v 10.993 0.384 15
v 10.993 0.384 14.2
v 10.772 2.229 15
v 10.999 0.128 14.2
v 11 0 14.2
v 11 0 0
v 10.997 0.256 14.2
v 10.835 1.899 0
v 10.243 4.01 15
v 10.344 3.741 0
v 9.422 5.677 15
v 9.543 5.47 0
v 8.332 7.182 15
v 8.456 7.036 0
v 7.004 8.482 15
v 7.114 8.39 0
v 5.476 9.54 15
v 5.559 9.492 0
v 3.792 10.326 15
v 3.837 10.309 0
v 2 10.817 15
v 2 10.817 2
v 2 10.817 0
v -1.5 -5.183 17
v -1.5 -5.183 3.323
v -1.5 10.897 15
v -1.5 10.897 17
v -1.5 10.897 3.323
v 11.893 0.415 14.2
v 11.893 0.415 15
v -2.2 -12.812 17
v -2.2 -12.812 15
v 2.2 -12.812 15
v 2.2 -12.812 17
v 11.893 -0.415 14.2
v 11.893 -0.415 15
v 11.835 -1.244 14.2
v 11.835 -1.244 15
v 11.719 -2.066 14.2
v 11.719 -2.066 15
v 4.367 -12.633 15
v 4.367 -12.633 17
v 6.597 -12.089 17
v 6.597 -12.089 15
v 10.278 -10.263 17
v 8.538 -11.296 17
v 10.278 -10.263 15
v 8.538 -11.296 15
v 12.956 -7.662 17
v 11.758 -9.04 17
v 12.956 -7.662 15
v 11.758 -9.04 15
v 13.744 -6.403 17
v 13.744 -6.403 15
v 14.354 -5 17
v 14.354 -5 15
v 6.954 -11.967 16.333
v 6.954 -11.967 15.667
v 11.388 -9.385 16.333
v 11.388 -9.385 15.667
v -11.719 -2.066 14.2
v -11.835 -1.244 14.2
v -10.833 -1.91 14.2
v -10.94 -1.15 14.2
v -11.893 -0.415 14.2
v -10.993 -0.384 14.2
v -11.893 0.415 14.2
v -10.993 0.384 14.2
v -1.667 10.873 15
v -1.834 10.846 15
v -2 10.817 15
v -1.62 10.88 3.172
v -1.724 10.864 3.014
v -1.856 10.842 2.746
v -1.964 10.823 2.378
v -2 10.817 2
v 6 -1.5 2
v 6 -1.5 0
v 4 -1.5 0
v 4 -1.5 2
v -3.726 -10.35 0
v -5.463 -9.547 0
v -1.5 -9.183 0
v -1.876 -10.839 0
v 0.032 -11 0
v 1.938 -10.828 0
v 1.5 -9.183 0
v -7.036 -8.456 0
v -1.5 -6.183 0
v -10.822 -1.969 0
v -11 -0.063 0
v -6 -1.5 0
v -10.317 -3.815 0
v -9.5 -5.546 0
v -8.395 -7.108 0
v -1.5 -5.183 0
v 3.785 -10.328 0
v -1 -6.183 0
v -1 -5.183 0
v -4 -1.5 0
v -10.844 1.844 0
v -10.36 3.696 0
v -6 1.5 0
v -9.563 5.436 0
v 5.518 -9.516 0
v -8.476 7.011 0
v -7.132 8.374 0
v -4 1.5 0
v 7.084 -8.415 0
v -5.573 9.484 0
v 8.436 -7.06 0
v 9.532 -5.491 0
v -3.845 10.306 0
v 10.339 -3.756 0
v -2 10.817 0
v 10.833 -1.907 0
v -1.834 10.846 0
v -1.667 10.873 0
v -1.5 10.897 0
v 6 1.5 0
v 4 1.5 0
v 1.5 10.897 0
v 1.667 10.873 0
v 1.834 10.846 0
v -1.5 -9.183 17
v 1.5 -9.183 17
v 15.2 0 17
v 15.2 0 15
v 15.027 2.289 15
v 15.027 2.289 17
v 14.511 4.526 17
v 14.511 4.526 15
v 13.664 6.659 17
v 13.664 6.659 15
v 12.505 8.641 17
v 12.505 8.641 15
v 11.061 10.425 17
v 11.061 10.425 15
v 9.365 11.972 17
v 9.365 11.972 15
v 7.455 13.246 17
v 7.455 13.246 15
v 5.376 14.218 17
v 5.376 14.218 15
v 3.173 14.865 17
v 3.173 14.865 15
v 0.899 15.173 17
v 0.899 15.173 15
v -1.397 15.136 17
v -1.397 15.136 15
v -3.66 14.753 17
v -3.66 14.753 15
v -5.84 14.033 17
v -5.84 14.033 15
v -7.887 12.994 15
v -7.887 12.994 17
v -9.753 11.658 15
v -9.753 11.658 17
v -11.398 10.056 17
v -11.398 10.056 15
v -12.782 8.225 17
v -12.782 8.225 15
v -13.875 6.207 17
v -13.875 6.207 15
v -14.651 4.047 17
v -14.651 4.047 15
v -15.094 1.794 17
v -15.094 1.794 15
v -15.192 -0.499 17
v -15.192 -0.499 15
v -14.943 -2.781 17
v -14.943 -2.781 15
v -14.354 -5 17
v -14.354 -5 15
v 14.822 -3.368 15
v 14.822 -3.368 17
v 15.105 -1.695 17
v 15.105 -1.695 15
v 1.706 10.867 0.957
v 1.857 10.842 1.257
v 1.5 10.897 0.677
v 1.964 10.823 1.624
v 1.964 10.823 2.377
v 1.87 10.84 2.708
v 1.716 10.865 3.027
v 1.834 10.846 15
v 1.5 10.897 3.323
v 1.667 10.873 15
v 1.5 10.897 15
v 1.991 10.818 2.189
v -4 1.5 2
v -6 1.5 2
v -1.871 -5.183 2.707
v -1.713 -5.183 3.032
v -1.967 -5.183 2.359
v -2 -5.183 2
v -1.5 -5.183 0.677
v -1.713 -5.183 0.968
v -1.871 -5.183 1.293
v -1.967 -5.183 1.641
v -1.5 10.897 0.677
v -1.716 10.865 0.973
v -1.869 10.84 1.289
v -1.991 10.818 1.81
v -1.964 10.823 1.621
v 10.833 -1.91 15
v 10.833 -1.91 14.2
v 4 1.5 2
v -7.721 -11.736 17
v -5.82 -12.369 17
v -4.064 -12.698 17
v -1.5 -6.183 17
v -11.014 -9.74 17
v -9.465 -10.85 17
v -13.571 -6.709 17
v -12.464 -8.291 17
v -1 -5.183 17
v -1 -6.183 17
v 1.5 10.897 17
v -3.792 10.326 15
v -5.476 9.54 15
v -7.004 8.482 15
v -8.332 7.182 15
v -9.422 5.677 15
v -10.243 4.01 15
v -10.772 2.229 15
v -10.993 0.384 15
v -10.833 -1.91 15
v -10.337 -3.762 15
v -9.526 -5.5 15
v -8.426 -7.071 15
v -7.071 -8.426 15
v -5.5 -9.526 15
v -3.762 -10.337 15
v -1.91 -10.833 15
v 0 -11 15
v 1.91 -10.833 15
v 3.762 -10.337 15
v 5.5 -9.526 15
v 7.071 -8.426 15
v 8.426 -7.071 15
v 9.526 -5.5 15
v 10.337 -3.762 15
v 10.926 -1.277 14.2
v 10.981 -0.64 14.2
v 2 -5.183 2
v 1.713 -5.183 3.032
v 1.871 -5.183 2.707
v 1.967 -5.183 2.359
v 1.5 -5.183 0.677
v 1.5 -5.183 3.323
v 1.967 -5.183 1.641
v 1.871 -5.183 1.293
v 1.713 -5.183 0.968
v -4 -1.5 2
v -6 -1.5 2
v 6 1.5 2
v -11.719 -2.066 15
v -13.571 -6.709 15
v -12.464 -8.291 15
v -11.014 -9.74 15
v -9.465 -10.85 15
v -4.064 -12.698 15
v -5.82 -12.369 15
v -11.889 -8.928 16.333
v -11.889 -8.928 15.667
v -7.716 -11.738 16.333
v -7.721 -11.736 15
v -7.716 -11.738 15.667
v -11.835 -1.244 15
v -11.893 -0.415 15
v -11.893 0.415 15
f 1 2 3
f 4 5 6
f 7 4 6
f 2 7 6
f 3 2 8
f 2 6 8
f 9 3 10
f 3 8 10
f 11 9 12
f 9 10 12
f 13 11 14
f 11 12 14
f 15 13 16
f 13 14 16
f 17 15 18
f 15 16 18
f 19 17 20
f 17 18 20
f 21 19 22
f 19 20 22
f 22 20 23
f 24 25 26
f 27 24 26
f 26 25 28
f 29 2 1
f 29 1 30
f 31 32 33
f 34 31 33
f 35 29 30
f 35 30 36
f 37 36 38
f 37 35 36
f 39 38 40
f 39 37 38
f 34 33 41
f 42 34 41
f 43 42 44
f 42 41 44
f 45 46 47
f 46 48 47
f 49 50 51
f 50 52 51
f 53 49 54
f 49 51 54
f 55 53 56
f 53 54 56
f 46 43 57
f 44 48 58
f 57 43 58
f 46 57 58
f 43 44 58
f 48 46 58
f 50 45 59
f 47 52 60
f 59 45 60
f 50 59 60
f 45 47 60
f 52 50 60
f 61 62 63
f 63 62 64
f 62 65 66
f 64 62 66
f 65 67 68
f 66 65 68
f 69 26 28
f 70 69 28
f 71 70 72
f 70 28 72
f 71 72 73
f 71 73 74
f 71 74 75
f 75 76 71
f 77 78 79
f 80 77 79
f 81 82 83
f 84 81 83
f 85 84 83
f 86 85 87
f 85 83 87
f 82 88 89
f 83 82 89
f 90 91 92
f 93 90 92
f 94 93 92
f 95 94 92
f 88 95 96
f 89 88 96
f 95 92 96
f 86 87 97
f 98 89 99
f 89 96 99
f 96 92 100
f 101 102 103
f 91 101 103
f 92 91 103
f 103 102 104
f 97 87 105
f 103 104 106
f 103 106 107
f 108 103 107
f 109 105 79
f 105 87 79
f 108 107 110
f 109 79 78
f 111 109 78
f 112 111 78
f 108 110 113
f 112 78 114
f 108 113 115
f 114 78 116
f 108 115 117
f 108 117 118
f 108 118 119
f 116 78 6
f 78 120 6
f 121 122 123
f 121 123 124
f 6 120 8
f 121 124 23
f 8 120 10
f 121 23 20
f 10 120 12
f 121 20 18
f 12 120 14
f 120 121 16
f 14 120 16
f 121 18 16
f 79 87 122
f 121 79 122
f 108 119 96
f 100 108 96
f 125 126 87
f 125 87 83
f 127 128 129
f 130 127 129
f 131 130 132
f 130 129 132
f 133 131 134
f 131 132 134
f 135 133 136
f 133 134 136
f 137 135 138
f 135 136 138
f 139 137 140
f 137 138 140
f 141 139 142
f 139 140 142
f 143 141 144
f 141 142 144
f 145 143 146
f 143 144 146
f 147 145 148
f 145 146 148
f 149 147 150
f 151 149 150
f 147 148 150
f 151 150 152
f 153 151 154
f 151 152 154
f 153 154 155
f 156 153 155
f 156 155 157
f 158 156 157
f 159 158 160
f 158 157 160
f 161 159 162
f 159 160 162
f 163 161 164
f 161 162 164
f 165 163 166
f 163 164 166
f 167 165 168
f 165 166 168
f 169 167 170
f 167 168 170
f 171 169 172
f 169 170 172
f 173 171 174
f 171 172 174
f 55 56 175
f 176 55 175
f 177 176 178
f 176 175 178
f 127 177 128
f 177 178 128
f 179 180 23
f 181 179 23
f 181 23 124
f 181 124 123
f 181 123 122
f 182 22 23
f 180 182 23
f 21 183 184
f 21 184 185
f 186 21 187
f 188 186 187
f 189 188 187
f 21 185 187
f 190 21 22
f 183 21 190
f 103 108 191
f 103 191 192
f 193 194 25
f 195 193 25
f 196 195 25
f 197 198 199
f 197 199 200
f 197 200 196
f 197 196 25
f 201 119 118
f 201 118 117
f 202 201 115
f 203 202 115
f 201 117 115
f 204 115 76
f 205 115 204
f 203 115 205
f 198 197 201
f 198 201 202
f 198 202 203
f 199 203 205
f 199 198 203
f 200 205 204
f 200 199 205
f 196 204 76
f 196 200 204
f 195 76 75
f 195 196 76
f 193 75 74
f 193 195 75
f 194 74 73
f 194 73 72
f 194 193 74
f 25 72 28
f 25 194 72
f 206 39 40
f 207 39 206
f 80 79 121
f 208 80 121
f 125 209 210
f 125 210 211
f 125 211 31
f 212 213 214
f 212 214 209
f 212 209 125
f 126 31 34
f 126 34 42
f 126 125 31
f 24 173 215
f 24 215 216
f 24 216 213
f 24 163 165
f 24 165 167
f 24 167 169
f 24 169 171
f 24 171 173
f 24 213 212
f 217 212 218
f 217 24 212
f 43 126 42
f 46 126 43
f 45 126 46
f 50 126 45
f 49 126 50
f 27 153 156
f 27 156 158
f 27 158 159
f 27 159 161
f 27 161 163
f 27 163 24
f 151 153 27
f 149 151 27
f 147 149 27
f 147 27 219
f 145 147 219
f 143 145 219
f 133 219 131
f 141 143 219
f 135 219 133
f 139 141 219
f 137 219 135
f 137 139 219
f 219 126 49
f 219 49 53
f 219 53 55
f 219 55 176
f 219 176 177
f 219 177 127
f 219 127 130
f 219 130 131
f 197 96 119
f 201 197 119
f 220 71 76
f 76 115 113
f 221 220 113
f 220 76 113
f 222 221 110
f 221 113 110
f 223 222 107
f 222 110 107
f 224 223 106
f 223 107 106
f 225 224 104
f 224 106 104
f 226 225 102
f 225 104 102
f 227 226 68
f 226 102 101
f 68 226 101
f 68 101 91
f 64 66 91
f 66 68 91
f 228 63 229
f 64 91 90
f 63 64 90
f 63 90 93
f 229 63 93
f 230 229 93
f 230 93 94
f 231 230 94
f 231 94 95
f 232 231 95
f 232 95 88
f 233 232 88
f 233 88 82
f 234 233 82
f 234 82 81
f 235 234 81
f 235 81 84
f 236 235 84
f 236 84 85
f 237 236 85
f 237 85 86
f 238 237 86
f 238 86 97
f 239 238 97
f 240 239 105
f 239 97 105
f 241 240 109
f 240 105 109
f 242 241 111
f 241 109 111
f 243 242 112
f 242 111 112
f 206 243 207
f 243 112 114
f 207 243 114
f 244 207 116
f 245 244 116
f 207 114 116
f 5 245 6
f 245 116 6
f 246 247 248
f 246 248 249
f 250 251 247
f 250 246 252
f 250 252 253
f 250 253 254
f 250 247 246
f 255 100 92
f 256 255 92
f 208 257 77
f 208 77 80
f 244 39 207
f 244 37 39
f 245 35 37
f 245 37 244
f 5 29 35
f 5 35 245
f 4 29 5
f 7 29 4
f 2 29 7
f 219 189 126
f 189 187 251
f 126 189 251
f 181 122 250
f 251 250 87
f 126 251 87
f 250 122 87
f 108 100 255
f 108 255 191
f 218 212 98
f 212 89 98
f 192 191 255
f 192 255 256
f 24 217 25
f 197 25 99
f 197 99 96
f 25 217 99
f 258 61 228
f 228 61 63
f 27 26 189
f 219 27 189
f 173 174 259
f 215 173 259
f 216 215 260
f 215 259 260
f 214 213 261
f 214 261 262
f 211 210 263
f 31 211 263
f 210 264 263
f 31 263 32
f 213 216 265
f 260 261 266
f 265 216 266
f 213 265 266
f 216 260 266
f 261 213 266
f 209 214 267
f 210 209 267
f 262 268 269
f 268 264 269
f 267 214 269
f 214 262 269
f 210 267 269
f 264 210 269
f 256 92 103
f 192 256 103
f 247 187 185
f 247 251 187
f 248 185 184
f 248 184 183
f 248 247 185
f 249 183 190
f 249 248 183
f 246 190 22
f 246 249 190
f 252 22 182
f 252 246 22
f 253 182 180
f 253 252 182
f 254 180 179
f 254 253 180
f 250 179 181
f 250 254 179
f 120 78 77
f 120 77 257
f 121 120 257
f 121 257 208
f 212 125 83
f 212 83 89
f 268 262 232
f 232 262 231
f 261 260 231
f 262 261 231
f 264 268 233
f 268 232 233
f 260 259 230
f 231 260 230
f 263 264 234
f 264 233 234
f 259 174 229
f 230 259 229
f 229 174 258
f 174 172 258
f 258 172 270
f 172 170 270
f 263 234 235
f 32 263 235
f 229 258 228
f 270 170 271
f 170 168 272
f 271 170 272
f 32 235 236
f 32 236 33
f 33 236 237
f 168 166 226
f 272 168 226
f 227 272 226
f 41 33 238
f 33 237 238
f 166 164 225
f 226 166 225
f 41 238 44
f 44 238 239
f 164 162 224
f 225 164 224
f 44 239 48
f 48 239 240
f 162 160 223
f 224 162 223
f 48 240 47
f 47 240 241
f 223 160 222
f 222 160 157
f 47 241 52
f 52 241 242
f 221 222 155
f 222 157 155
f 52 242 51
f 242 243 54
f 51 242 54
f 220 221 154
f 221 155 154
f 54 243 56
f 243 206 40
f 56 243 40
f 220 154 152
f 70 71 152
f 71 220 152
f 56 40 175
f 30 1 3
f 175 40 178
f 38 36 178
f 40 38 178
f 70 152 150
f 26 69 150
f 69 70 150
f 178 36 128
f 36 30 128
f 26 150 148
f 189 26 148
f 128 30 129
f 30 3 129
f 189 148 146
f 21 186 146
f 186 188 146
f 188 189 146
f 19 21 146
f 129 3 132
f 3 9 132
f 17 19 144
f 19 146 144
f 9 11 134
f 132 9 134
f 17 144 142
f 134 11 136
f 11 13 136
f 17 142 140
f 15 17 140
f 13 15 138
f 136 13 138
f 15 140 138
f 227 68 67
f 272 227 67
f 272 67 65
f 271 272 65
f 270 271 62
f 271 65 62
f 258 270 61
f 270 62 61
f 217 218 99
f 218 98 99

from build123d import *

# Parameters (mm, degrees)
SKETCH1_W                       = 0.5
SKETCH1_H                       = 16
SKETCH1_H_2                     = 1
SKETCH1_H_3                     = 3
BOSS_EXTRUDE1_DEPTH             = 15
SKETCH5_W                       = 2
SKETCH5_H                       = 3
CUT_EXTRUDE1_DEPTH              = 2
BOSS_EXTRUDE2_DEPTH             = 2
STICK_START                     = -2.8
STICK_OUTS_DEPTH                = 0.8
PIN_HOLE_SKETCH_R               = 2
PIN_HOLE_DEPTH                  = 5.183346
PIN_HOLE_DIRECTION_2_REACH      = 29.406
PIN_HOLE_DIRECTION_2_END_RADIUS = 11


with BuildPart() as part:
    # Sketch1 → Boss-Extrude1 (new body)
    with BuildSketch(Plane.XY):
        with BuildLine():
            Line((-2, -5.183346174), (-2, 10.816653826))
            ThreePointArc((-2, 10.816653826), (-7.03562364, -8.455767263), (11, 0))
            ThreePointArc((11, 0), (8.455767263, 7.03562364), (2, 10.816653826))
            Line((2, 10.816653826), (2, -5.183346174))
            Line((2, -5.183346174), (2, -6.183346174))
            Line((2, -6.183346174), (2, -9.183346174))
            Line((2, -9.183346174), (1.5, -9.183346174))
            Line((1.5, -9.183346174), (-1.5, -9.183346174))
            Line((-1.5, -9.183346174), (-2, -9.183346174))
            Line((-2, -9.183346174), (-2, -6.183346174))
            Line((-2, -6.183346174), (-1.5, -6.183346174))
            Line((-1.5, -6.183346174), (-1, -6.183346174))
            Line((-1, -6.183346174), (-1, -5.183346174))
            Line((-1, -5.183346174), (-1.5, -5.183346174))
            Line((-1.5, -5.183346174), (-2, -5.183346174))
        make_face()
        with Locations((1.75, 2.816653826)):
            Rectangle(SKETCH1_W, SKETCH1_H)
        with Locations((1.75, -5.683346174)):
            Rectangle(SKETCH1_W, SKETCH1_H_2)
        with Locations((1.75, -7.683346174)):
            Rectangle(SKETCH1_W, SKETCH1_H_3)
        with Locations((-1.75, -7.683346174)):
            Rectangle(SKETCH1_W, SKETCH1_H_3)
        with Locations((-1.75, 2.816653826)):
            Rectangle(SKETCH1_W, SKETCH1_H)
        with BuildLine():
            ThreePointArc((2, 10.816653826), (1.75046389, 10.859828552), (1.5, 10.897247359))
            Line((1.5, 10.897247359), (1.5, 10.816653826))
            Line((1.5, 10.816653826), (2, 10.816653826))
        make_face()
        with BuildLine():
            Line((-1.5, 10.816653826), (-1.5, 10.897247359))
            ThreePointArc((-1.5, 10.897247359), (-1.75046389, 10.859828552), (-2, 10.816653826))
            Line((-2, 10.816653826), (-1.5, 10.816653826))
        make_face()
    extrude(amount=BOSS_EXTRUDE1_DEPTH)

    # Sketch5 → Cut-Extrude1 (cut)
    with BuildSketch(Plane(origin=(0, 0, 0), x_dir=(-1, 0, 0), z_dir=(0, 0, -1))):
        with Locations((-5, 0)):
            Rectangle(SKETCH5_W, SKETCH5_H)
        with Locations((5, 0)):
            Rectangle(SKETCH5_W, SKETCH5_H)
    extrude(amount=-CUT_EXTRUDE1_DEPTH, mode=Mode.SUBTRACT)

    # Sketch3 → Boss-Extrude2 (add)
    with BuildSketch(Plane.XY.offset(15)):
        with BuildLine():
            add(Edge.make_bspline(
                [(-14.354093493, -5), (-12.863344749, -9.279669369), (-8.266658173, -12.812493902), (-2.2, -12.812493902)],
                knots=[0, 0, 0, 0, 1, 1, 1, 1], degree=3))
            ThreePointArc((-2.2, -12.812493902), (-8.103626672, -10.165197232), (-12, -5))
            Line((-12, -5), (-14.354093493, -5))
        make_face()
        with BuildLine():
            Line((-2.2, -12.812493902), (2.2, -12.812493902))
            ThreePointArc((2.2, -12.812493902), (8.103626672, -10.165197232), (12, -5))
            Line((12, -5), (9.797958971, -5))
            ThreePointArc((9.797958971, -5), (0, -11), (-9.797958971, -5))
            Line((-9.797958971, -5), (-12, -5))
            ThreePointArc((-12, -5), (-8.103626672, -10.165197232), (-2.2, -12.812493902))
        make_face()
        with BuildLine():
            ThreePointArc((12, -5), (8.103626672, -10.165197232), (2.2, -12.812493902))
            add(Edge.make_bspline(
                [(2.2, -12.812493902), (6.731876181, -12.812493902), (12.505086924, -10.308162631), (14.354093493, -5)],
                knots=[0, 0, 0, 0, 1, 1, 1, 1], degree=3))
            Line((14.354093493, -5), (12, -5))
        make_face()
        with BuildLine():
            ThreePointArc((-9.797958971, -5), (0, -11), (9.797958971, -5))
            Line((9.797958971, -5), (1.5, -5))
            Line((1.5, -5), (1.5, -9.183346174))
            Line((1.5, -9.183346174), (-1.5, -9.183346174))
            Line((-1.5, -9.183346174), (-1.5, -6.183346174))
            Line((-1.5, -6.183346174), (-1, -6.183346174))
            Line((-1, -6.183346174), (-1, -5.183346174))
            Line((-1, -5.183346174), (-1.5, -5.183346174))
            Line((-1.5, -5.183346174), (-1.5, -5))
            Line((-1.5, -5), (-9.797958971, -5))
        make_face()
        with BuildLine():
            Line((1.5, -5), (9.797958971, -5))
            ThreePointArc((9.797958971, -5), (10.695268783, -2.571230378), (11, 0))
            ThreePointArc((11, 0), (8.291561976, 7.228416147), (1.5, 10.897247359))
            Line((1.5, 10.897247359), (1.5, -5))
        make_face()
        with BuildLine():
            ThreePointArc((-1.5, 10.897247359), (-9.751491559, 5.090030685), (-9.797958971, -5))
            Line((-9.797958971, -5), (-1.5, -5))
            Line((-1.5, -5), (-1.5, 10.897247359))
        make_face()
        with BuildLine():
            Line((9.797958971, -5), (12, -5))
            ThreePointArc((12, -5), (12.747548784, -2.549509757), (13, 0))
            ThreePointArc((13, 0), (-2.549509757, 12.747548784), (-12, -5))
            Line((-12, -5), (-9.797958971, -5))
            ThreePointArc((-9.797958971, -5), (-9.751491559, 5.090030685), (-1.5, 10.897247359))
            ThreePointArc((-1.5, 10.897247359), (0, 11), (1.5, 10.897247359))
            ThreePointArc((1.5, 10.897247359), (8.291561976, 7.228416147), (11, 0))
            ThreePointArc((11, 0), (10.695268783, -2.571230378), (9.797958971, -5))
        make_face()
        with BuildLine():
            ThreePointArc((13, 0), (12.747548784, -2.549509757), (12, -5))
            Line((12, -5), (14.354093493, -5))
            ThreePointArc((14.354093493, -5), (14.987031412, -2.535525479), (15.2, 0))
            ThreePointArc((15.2, 0), (-2.535525479, 14.987031412), (-14.354093493, -5))
            Line((-14.354093493, -5), (-12, -5))
            ThreePointArc((-12, -5), (-2.549509757, 12.747548784), (13, 0))
        make_face()
        with BuildLine():
            ThreePointArc((1.5, 10.897247359), (0, 11), (-1.5, 10.897247359))
            Line((-1.5, 10.897247359), (1.5, 10.897247359))
        make_face()
    extrude(amount=BOSS_EXTRUDE2_DEPTH)

    # Sketch6 → Stick Outs (add)
    with BuildSketch(Plane.XY.offset(17).offset(STICK_START)):
        with BuildLine():
            Line((-11.719212261, -2.066413314), (-10.832885283, -1.910129954))
            ThreePointArc((-10.832885283, -1.910129954), (-10.973204553, -0.767321211), (-10.993299097, 0.383894464))
            Line((-10.993299097, 0.383894464), (-11.892750842, 0.415304011))
            ThreePointArc((-11.892750842, 0.415304011), (-11.871012198, -0.830102038), (-11.719212261, -2.066413314))
        make_face()
    stick_outs = extrude(amount=STICK_OUTS_DEPTH)

    # Mirror1: Stick Outs across plane
    add(stick_outs.mirror(Plane(origin=(0, 0, 0), x_dir=(0, 0, 1), z_dir=(1, 0, 0))))

    # Pin Hole sketch → Pin hole (cut)
    with BuildSketch(Plane(origin=(0, 0, 0), x_dir=(1, 0, 0), z_dir=(0, 1, 0))):
        with Locations((0, -2)):
            Circle(PIN_HOLE_SKETCH_R)
    extrude(amount=-PIN_HOLE_DEPTH, mode=Mode.SUBTRACT)

    # Pin hole direction 2: up to this cylinder (the profile starts inside it)
    pin_hole_direction_2_end = Plane(origin=(0, 0, 2), z_dir=(0, 0, -1)) * Cylinder(PIN_HOLE_DIRECTION_2_END_RADIUS, 81.812, mode=Mode.PRIVATE)
    # Pin Hole sketch → Pin hole direction 2 (cut, up to the surface)
    with BuildSketch(Plane(origin=(0, 0, 0), x_dir=(1, 0, 0), z_dir=(0, 1, 0)), mode=Mode.PRIVATE) as pin_hole_direction_2_sk1:
        with Locations((0, -2)):
            Circle(PIN_HOLE_SKETCH_R)
    pin_hole_direction_2_tool1 = extrude(pin_hole_direction_2_sk1.sketch, amount=PIN_HOLE_DIRECTION_2_REACH, mode=Mode.PRIVATE) & pin_hole_direction_2_end
    add(pin_hole_direction_2_tool1.solids().sort_by_distance((0, 0, 2))[0], mode=Mode.SUBTRACT)


solid = part.part
